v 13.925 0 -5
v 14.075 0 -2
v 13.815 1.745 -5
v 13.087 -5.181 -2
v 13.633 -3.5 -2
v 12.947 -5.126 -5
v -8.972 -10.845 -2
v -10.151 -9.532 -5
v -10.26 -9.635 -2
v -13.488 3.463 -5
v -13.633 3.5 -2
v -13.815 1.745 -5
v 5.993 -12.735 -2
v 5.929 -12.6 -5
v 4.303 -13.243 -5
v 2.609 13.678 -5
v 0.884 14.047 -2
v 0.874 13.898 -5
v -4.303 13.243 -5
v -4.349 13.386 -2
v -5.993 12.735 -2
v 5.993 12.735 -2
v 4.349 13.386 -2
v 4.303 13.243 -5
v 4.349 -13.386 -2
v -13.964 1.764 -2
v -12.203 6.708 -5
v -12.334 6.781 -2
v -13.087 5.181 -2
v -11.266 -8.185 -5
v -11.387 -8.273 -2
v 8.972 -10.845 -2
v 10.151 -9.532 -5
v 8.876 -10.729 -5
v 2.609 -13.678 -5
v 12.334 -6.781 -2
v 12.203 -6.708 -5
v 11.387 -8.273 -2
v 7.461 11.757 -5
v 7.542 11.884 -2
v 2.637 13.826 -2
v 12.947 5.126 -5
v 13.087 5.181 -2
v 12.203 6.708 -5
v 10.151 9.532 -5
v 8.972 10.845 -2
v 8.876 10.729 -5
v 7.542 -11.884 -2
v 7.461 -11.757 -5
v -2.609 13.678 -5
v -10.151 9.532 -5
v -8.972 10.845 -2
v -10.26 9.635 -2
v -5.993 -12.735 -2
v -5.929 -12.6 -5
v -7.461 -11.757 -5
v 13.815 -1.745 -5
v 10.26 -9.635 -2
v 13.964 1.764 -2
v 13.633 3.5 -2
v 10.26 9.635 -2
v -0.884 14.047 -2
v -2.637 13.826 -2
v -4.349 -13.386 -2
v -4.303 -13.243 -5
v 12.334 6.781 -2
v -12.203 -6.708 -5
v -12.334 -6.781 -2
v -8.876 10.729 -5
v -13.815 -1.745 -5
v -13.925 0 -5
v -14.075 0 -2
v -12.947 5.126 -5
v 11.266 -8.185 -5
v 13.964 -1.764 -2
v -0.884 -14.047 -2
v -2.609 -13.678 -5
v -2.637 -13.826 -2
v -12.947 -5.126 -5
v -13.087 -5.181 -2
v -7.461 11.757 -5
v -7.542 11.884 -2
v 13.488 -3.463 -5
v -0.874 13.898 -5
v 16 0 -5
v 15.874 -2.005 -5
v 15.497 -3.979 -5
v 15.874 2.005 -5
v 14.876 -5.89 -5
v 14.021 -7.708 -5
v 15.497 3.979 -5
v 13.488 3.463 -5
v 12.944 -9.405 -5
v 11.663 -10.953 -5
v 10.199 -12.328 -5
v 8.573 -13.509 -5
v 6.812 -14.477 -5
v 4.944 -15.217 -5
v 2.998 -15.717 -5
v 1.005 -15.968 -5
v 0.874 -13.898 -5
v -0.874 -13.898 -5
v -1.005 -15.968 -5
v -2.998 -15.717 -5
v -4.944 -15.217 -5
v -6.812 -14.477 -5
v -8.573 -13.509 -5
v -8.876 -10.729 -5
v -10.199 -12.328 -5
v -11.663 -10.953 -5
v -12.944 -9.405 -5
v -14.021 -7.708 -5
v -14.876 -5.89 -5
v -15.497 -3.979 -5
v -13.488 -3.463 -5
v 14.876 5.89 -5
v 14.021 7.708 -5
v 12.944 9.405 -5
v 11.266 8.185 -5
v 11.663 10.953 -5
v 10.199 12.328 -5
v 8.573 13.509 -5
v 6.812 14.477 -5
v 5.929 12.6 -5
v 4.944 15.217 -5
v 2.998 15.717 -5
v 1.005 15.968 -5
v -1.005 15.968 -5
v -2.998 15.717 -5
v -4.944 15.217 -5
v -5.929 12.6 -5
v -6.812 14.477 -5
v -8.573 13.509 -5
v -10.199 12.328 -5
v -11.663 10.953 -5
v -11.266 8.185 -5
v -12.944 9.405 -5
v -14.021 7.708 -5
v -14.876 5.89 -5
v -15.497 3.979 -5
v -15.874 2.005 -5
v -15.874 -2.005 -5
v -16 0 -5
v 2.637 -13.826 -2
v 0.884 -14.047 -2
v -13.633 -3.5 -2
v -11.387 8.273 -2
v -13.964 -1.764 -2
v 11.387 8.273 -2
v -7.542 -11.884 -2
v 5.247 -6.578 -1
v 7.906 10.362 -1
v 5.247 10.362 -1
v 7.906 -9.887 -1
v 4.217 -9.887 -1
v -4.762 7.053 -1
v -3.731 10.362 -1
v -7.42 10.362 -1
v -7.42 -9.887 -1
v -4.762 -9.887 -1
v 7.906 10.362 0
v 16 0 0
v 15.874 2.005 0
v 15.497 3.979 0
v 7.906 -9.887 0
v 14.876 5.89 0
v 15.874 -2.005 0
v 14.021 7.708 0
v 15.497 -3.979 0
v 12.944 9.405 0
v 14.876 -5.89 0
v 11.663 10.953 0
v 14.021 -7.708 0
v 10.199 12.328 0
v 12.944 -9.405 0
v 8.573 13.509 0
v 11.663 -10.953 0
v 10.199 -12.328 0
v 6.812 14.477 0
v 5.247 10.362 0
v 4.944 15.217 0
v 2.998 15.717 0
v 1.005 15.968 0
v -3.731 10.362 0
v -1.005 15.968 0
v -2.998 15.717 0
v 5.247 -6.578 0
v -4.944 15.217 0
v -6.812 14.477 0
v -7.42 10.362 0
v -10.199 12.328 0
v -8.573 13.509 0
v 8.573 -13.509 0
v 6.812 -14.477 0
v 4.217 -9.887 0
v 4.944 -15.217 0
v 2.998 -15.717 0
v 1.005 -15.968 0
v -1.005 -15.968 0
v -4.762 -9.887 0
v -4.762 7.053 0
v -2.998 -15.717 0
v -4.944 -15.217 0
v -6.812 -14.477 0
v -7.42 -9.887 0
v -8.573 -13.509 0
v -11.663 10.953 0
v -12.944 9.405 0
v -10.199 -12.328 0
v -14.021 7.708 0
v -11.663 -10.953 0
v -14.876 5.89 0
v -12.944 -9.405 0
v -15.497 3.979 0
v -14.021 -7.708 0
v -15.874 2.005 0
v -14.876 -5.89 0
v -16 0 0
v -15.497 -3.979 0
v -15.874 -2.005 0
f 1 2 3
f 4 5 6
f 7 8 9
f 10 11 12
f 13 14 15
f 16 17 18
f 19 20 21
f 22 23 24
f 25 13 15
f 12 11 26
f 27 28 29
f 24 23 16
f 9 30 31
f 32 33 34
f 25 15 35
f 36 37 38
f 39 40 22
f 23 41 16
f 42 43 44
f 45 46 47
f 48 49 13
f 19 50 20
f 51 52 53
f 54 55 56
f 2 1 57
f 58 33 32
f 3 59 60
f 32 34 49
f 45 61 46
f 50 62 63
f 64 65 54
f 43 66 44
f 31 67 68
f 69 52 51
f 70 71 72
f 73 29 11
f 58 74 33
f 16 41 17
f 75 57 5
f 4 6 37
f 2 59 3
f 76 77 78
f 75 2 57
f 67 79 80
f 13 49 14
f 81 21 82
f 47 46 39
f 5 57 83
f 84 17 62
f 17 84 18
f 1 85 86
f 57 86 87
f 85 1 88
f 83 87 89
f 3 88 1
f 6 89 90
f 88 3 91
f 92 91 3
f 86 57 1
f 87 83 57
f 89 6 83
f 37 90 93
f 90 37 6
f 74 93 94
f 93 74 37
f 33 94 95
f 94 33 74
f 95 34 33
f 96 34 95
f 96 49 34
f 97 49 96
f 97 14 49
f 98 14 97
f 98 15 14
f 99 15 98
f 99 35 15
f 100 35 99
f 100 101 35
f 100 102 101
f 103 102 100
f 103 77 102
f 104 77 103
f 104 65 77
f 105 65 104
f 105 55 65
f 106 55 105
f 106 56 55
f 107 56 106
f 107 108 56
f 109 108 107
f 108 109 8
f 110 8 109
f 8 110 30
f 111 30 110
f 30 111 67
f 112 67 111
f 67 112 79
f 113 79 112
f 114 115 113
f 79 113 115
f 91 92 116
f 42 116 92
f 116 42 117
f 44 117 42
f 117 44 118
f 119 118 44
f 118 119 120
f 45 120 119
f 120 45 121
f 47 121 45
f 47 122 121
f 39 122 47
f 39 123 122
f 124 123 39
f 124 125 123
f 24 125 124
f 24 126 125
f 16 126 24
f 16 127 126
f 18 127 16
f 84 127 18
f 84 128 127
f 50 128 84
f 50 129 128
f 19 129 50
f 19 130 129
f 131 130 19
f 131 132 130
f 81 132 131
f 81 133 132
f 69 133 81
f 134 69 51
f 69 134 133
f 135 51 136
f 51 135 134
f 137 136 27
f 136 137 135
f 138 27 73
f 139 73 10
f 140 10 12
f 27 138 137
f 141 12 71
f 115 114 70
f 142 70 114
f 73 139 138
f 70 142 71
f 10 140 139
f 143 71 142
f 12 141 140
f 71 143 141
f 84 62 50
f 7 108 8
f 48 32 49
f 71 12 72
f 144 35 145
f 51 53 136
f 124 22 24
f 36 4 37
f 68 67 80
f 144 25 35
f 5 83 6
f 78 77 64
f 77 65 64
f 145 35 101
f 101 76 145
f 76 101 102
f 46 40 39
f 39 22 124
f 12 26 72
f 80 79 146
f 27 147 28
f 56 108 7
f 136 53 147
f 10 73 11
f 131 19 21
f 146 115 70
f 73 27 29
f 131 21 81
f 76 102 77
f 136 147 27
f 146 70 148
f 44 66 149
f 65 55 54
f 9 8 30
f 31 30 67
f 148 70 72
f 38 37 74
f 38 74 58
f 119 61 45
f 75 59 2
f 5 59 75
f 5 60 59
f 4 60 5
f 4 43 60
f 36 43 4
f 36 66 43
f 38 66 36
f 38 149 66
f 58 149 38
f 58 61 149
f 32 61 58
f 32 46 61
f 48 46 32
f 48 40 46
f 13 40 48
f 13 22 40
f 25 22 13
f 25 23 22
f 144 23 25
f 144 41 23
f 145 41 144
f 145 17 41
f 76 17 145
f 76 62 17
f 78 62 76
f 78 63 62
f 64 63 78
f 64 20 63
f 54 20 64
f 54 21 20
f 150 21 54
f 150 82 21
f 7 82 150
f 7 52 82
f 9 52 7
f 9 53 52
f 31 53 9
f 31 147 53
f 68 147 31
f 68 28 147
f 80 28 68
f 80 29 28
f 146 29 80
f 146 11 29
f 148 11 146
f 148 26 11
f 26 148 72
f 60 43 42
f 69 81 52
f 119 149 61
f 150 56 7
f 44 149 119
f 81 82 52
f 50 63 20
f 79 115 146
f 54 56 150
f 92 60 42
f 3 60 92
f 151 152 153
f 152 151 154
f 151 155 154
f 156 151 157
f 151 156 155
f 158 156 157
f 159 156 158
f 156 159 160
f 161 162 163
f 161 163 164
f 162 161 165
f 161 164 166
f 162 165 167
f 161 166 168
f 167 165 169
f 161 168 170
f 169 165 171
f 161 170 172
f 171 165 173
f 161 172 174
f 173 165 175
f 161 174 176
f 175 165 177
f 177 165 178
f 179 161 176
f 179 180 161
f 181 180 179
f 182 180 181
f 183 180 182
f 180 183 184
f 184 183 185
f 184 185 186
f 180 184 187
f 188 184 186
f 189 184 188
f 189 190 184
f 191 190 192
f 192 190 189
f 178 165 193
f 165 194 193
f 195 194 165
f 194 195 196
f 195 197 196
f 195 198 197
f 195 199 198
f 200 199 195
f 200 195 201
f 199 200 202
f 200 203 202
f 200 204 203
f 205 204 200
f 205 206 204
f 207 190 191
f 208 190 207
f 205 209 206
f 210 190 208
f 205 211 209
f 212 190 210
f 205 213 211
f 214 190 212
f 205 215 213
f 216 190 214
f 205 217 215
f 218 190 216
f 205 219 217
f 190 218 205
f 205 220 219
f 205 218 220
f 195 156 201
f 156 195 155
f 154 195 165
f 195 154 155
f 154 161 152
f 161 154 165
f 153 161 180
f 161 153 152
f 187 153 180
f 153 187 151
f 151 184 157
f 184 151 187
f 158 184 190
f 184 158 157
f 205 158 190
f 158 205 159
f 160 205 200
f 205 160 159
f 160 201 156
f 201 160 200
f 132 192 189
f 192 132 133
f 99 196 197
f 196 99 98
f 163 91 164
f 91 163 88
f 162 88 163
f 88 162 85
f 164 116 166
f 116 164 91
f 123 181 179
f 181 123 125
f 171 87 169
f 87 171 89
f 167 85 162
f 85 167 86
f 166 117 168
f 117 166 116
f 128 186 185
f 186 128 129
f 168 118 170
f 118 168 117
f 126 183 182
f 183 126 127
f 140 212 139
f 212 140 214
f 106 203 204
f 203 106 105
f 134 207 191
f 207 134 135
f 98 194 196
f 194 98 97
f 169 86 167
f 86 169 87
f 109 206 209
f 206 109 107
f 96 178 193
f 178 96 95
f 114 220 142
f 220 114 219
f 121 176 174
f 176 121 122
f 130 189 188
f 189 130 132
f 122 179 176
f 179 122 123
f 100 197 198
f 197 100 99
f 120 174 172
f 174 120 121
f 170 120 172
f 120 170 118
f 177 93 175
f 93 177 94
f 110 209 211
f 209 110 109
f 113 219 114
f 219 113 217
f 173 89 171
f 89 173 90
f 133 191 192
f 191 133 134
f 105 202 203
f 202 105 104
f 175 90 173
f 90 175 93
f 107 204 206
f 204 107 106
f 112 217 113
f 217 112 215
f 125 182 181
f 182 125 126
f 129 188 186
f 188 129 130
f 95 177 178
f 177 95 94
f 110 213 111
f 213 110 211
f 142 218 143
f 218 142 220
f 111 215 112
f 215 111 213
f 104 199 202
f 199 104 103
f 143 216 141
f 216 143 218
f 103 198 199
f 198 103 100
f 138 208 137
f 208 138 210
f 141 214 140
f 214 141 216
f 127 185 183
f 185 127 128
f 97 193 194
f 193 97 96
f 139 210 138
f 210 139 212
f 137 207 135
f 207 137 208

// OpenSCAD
$fn = 50;


difference() {
	union() {
		translate(v = [0, 0, -5.0000000000]) {
			cylinder(h = 5, r = 16.0000000000);
		}
	}
	union() {
		#translate(v = [0, 0, -5.0000000000]) {
			cylinder(h = 3, r1 = 13.9250000000, r2 = 14.0750000000);
		}
		translate(v = [0, 0, -1]) {
			linear_extrude(height = 1) {
				text(font = "Impact", halign = "center", size = 20, text = "N", valign = "center");
			}
		}
	}
}
